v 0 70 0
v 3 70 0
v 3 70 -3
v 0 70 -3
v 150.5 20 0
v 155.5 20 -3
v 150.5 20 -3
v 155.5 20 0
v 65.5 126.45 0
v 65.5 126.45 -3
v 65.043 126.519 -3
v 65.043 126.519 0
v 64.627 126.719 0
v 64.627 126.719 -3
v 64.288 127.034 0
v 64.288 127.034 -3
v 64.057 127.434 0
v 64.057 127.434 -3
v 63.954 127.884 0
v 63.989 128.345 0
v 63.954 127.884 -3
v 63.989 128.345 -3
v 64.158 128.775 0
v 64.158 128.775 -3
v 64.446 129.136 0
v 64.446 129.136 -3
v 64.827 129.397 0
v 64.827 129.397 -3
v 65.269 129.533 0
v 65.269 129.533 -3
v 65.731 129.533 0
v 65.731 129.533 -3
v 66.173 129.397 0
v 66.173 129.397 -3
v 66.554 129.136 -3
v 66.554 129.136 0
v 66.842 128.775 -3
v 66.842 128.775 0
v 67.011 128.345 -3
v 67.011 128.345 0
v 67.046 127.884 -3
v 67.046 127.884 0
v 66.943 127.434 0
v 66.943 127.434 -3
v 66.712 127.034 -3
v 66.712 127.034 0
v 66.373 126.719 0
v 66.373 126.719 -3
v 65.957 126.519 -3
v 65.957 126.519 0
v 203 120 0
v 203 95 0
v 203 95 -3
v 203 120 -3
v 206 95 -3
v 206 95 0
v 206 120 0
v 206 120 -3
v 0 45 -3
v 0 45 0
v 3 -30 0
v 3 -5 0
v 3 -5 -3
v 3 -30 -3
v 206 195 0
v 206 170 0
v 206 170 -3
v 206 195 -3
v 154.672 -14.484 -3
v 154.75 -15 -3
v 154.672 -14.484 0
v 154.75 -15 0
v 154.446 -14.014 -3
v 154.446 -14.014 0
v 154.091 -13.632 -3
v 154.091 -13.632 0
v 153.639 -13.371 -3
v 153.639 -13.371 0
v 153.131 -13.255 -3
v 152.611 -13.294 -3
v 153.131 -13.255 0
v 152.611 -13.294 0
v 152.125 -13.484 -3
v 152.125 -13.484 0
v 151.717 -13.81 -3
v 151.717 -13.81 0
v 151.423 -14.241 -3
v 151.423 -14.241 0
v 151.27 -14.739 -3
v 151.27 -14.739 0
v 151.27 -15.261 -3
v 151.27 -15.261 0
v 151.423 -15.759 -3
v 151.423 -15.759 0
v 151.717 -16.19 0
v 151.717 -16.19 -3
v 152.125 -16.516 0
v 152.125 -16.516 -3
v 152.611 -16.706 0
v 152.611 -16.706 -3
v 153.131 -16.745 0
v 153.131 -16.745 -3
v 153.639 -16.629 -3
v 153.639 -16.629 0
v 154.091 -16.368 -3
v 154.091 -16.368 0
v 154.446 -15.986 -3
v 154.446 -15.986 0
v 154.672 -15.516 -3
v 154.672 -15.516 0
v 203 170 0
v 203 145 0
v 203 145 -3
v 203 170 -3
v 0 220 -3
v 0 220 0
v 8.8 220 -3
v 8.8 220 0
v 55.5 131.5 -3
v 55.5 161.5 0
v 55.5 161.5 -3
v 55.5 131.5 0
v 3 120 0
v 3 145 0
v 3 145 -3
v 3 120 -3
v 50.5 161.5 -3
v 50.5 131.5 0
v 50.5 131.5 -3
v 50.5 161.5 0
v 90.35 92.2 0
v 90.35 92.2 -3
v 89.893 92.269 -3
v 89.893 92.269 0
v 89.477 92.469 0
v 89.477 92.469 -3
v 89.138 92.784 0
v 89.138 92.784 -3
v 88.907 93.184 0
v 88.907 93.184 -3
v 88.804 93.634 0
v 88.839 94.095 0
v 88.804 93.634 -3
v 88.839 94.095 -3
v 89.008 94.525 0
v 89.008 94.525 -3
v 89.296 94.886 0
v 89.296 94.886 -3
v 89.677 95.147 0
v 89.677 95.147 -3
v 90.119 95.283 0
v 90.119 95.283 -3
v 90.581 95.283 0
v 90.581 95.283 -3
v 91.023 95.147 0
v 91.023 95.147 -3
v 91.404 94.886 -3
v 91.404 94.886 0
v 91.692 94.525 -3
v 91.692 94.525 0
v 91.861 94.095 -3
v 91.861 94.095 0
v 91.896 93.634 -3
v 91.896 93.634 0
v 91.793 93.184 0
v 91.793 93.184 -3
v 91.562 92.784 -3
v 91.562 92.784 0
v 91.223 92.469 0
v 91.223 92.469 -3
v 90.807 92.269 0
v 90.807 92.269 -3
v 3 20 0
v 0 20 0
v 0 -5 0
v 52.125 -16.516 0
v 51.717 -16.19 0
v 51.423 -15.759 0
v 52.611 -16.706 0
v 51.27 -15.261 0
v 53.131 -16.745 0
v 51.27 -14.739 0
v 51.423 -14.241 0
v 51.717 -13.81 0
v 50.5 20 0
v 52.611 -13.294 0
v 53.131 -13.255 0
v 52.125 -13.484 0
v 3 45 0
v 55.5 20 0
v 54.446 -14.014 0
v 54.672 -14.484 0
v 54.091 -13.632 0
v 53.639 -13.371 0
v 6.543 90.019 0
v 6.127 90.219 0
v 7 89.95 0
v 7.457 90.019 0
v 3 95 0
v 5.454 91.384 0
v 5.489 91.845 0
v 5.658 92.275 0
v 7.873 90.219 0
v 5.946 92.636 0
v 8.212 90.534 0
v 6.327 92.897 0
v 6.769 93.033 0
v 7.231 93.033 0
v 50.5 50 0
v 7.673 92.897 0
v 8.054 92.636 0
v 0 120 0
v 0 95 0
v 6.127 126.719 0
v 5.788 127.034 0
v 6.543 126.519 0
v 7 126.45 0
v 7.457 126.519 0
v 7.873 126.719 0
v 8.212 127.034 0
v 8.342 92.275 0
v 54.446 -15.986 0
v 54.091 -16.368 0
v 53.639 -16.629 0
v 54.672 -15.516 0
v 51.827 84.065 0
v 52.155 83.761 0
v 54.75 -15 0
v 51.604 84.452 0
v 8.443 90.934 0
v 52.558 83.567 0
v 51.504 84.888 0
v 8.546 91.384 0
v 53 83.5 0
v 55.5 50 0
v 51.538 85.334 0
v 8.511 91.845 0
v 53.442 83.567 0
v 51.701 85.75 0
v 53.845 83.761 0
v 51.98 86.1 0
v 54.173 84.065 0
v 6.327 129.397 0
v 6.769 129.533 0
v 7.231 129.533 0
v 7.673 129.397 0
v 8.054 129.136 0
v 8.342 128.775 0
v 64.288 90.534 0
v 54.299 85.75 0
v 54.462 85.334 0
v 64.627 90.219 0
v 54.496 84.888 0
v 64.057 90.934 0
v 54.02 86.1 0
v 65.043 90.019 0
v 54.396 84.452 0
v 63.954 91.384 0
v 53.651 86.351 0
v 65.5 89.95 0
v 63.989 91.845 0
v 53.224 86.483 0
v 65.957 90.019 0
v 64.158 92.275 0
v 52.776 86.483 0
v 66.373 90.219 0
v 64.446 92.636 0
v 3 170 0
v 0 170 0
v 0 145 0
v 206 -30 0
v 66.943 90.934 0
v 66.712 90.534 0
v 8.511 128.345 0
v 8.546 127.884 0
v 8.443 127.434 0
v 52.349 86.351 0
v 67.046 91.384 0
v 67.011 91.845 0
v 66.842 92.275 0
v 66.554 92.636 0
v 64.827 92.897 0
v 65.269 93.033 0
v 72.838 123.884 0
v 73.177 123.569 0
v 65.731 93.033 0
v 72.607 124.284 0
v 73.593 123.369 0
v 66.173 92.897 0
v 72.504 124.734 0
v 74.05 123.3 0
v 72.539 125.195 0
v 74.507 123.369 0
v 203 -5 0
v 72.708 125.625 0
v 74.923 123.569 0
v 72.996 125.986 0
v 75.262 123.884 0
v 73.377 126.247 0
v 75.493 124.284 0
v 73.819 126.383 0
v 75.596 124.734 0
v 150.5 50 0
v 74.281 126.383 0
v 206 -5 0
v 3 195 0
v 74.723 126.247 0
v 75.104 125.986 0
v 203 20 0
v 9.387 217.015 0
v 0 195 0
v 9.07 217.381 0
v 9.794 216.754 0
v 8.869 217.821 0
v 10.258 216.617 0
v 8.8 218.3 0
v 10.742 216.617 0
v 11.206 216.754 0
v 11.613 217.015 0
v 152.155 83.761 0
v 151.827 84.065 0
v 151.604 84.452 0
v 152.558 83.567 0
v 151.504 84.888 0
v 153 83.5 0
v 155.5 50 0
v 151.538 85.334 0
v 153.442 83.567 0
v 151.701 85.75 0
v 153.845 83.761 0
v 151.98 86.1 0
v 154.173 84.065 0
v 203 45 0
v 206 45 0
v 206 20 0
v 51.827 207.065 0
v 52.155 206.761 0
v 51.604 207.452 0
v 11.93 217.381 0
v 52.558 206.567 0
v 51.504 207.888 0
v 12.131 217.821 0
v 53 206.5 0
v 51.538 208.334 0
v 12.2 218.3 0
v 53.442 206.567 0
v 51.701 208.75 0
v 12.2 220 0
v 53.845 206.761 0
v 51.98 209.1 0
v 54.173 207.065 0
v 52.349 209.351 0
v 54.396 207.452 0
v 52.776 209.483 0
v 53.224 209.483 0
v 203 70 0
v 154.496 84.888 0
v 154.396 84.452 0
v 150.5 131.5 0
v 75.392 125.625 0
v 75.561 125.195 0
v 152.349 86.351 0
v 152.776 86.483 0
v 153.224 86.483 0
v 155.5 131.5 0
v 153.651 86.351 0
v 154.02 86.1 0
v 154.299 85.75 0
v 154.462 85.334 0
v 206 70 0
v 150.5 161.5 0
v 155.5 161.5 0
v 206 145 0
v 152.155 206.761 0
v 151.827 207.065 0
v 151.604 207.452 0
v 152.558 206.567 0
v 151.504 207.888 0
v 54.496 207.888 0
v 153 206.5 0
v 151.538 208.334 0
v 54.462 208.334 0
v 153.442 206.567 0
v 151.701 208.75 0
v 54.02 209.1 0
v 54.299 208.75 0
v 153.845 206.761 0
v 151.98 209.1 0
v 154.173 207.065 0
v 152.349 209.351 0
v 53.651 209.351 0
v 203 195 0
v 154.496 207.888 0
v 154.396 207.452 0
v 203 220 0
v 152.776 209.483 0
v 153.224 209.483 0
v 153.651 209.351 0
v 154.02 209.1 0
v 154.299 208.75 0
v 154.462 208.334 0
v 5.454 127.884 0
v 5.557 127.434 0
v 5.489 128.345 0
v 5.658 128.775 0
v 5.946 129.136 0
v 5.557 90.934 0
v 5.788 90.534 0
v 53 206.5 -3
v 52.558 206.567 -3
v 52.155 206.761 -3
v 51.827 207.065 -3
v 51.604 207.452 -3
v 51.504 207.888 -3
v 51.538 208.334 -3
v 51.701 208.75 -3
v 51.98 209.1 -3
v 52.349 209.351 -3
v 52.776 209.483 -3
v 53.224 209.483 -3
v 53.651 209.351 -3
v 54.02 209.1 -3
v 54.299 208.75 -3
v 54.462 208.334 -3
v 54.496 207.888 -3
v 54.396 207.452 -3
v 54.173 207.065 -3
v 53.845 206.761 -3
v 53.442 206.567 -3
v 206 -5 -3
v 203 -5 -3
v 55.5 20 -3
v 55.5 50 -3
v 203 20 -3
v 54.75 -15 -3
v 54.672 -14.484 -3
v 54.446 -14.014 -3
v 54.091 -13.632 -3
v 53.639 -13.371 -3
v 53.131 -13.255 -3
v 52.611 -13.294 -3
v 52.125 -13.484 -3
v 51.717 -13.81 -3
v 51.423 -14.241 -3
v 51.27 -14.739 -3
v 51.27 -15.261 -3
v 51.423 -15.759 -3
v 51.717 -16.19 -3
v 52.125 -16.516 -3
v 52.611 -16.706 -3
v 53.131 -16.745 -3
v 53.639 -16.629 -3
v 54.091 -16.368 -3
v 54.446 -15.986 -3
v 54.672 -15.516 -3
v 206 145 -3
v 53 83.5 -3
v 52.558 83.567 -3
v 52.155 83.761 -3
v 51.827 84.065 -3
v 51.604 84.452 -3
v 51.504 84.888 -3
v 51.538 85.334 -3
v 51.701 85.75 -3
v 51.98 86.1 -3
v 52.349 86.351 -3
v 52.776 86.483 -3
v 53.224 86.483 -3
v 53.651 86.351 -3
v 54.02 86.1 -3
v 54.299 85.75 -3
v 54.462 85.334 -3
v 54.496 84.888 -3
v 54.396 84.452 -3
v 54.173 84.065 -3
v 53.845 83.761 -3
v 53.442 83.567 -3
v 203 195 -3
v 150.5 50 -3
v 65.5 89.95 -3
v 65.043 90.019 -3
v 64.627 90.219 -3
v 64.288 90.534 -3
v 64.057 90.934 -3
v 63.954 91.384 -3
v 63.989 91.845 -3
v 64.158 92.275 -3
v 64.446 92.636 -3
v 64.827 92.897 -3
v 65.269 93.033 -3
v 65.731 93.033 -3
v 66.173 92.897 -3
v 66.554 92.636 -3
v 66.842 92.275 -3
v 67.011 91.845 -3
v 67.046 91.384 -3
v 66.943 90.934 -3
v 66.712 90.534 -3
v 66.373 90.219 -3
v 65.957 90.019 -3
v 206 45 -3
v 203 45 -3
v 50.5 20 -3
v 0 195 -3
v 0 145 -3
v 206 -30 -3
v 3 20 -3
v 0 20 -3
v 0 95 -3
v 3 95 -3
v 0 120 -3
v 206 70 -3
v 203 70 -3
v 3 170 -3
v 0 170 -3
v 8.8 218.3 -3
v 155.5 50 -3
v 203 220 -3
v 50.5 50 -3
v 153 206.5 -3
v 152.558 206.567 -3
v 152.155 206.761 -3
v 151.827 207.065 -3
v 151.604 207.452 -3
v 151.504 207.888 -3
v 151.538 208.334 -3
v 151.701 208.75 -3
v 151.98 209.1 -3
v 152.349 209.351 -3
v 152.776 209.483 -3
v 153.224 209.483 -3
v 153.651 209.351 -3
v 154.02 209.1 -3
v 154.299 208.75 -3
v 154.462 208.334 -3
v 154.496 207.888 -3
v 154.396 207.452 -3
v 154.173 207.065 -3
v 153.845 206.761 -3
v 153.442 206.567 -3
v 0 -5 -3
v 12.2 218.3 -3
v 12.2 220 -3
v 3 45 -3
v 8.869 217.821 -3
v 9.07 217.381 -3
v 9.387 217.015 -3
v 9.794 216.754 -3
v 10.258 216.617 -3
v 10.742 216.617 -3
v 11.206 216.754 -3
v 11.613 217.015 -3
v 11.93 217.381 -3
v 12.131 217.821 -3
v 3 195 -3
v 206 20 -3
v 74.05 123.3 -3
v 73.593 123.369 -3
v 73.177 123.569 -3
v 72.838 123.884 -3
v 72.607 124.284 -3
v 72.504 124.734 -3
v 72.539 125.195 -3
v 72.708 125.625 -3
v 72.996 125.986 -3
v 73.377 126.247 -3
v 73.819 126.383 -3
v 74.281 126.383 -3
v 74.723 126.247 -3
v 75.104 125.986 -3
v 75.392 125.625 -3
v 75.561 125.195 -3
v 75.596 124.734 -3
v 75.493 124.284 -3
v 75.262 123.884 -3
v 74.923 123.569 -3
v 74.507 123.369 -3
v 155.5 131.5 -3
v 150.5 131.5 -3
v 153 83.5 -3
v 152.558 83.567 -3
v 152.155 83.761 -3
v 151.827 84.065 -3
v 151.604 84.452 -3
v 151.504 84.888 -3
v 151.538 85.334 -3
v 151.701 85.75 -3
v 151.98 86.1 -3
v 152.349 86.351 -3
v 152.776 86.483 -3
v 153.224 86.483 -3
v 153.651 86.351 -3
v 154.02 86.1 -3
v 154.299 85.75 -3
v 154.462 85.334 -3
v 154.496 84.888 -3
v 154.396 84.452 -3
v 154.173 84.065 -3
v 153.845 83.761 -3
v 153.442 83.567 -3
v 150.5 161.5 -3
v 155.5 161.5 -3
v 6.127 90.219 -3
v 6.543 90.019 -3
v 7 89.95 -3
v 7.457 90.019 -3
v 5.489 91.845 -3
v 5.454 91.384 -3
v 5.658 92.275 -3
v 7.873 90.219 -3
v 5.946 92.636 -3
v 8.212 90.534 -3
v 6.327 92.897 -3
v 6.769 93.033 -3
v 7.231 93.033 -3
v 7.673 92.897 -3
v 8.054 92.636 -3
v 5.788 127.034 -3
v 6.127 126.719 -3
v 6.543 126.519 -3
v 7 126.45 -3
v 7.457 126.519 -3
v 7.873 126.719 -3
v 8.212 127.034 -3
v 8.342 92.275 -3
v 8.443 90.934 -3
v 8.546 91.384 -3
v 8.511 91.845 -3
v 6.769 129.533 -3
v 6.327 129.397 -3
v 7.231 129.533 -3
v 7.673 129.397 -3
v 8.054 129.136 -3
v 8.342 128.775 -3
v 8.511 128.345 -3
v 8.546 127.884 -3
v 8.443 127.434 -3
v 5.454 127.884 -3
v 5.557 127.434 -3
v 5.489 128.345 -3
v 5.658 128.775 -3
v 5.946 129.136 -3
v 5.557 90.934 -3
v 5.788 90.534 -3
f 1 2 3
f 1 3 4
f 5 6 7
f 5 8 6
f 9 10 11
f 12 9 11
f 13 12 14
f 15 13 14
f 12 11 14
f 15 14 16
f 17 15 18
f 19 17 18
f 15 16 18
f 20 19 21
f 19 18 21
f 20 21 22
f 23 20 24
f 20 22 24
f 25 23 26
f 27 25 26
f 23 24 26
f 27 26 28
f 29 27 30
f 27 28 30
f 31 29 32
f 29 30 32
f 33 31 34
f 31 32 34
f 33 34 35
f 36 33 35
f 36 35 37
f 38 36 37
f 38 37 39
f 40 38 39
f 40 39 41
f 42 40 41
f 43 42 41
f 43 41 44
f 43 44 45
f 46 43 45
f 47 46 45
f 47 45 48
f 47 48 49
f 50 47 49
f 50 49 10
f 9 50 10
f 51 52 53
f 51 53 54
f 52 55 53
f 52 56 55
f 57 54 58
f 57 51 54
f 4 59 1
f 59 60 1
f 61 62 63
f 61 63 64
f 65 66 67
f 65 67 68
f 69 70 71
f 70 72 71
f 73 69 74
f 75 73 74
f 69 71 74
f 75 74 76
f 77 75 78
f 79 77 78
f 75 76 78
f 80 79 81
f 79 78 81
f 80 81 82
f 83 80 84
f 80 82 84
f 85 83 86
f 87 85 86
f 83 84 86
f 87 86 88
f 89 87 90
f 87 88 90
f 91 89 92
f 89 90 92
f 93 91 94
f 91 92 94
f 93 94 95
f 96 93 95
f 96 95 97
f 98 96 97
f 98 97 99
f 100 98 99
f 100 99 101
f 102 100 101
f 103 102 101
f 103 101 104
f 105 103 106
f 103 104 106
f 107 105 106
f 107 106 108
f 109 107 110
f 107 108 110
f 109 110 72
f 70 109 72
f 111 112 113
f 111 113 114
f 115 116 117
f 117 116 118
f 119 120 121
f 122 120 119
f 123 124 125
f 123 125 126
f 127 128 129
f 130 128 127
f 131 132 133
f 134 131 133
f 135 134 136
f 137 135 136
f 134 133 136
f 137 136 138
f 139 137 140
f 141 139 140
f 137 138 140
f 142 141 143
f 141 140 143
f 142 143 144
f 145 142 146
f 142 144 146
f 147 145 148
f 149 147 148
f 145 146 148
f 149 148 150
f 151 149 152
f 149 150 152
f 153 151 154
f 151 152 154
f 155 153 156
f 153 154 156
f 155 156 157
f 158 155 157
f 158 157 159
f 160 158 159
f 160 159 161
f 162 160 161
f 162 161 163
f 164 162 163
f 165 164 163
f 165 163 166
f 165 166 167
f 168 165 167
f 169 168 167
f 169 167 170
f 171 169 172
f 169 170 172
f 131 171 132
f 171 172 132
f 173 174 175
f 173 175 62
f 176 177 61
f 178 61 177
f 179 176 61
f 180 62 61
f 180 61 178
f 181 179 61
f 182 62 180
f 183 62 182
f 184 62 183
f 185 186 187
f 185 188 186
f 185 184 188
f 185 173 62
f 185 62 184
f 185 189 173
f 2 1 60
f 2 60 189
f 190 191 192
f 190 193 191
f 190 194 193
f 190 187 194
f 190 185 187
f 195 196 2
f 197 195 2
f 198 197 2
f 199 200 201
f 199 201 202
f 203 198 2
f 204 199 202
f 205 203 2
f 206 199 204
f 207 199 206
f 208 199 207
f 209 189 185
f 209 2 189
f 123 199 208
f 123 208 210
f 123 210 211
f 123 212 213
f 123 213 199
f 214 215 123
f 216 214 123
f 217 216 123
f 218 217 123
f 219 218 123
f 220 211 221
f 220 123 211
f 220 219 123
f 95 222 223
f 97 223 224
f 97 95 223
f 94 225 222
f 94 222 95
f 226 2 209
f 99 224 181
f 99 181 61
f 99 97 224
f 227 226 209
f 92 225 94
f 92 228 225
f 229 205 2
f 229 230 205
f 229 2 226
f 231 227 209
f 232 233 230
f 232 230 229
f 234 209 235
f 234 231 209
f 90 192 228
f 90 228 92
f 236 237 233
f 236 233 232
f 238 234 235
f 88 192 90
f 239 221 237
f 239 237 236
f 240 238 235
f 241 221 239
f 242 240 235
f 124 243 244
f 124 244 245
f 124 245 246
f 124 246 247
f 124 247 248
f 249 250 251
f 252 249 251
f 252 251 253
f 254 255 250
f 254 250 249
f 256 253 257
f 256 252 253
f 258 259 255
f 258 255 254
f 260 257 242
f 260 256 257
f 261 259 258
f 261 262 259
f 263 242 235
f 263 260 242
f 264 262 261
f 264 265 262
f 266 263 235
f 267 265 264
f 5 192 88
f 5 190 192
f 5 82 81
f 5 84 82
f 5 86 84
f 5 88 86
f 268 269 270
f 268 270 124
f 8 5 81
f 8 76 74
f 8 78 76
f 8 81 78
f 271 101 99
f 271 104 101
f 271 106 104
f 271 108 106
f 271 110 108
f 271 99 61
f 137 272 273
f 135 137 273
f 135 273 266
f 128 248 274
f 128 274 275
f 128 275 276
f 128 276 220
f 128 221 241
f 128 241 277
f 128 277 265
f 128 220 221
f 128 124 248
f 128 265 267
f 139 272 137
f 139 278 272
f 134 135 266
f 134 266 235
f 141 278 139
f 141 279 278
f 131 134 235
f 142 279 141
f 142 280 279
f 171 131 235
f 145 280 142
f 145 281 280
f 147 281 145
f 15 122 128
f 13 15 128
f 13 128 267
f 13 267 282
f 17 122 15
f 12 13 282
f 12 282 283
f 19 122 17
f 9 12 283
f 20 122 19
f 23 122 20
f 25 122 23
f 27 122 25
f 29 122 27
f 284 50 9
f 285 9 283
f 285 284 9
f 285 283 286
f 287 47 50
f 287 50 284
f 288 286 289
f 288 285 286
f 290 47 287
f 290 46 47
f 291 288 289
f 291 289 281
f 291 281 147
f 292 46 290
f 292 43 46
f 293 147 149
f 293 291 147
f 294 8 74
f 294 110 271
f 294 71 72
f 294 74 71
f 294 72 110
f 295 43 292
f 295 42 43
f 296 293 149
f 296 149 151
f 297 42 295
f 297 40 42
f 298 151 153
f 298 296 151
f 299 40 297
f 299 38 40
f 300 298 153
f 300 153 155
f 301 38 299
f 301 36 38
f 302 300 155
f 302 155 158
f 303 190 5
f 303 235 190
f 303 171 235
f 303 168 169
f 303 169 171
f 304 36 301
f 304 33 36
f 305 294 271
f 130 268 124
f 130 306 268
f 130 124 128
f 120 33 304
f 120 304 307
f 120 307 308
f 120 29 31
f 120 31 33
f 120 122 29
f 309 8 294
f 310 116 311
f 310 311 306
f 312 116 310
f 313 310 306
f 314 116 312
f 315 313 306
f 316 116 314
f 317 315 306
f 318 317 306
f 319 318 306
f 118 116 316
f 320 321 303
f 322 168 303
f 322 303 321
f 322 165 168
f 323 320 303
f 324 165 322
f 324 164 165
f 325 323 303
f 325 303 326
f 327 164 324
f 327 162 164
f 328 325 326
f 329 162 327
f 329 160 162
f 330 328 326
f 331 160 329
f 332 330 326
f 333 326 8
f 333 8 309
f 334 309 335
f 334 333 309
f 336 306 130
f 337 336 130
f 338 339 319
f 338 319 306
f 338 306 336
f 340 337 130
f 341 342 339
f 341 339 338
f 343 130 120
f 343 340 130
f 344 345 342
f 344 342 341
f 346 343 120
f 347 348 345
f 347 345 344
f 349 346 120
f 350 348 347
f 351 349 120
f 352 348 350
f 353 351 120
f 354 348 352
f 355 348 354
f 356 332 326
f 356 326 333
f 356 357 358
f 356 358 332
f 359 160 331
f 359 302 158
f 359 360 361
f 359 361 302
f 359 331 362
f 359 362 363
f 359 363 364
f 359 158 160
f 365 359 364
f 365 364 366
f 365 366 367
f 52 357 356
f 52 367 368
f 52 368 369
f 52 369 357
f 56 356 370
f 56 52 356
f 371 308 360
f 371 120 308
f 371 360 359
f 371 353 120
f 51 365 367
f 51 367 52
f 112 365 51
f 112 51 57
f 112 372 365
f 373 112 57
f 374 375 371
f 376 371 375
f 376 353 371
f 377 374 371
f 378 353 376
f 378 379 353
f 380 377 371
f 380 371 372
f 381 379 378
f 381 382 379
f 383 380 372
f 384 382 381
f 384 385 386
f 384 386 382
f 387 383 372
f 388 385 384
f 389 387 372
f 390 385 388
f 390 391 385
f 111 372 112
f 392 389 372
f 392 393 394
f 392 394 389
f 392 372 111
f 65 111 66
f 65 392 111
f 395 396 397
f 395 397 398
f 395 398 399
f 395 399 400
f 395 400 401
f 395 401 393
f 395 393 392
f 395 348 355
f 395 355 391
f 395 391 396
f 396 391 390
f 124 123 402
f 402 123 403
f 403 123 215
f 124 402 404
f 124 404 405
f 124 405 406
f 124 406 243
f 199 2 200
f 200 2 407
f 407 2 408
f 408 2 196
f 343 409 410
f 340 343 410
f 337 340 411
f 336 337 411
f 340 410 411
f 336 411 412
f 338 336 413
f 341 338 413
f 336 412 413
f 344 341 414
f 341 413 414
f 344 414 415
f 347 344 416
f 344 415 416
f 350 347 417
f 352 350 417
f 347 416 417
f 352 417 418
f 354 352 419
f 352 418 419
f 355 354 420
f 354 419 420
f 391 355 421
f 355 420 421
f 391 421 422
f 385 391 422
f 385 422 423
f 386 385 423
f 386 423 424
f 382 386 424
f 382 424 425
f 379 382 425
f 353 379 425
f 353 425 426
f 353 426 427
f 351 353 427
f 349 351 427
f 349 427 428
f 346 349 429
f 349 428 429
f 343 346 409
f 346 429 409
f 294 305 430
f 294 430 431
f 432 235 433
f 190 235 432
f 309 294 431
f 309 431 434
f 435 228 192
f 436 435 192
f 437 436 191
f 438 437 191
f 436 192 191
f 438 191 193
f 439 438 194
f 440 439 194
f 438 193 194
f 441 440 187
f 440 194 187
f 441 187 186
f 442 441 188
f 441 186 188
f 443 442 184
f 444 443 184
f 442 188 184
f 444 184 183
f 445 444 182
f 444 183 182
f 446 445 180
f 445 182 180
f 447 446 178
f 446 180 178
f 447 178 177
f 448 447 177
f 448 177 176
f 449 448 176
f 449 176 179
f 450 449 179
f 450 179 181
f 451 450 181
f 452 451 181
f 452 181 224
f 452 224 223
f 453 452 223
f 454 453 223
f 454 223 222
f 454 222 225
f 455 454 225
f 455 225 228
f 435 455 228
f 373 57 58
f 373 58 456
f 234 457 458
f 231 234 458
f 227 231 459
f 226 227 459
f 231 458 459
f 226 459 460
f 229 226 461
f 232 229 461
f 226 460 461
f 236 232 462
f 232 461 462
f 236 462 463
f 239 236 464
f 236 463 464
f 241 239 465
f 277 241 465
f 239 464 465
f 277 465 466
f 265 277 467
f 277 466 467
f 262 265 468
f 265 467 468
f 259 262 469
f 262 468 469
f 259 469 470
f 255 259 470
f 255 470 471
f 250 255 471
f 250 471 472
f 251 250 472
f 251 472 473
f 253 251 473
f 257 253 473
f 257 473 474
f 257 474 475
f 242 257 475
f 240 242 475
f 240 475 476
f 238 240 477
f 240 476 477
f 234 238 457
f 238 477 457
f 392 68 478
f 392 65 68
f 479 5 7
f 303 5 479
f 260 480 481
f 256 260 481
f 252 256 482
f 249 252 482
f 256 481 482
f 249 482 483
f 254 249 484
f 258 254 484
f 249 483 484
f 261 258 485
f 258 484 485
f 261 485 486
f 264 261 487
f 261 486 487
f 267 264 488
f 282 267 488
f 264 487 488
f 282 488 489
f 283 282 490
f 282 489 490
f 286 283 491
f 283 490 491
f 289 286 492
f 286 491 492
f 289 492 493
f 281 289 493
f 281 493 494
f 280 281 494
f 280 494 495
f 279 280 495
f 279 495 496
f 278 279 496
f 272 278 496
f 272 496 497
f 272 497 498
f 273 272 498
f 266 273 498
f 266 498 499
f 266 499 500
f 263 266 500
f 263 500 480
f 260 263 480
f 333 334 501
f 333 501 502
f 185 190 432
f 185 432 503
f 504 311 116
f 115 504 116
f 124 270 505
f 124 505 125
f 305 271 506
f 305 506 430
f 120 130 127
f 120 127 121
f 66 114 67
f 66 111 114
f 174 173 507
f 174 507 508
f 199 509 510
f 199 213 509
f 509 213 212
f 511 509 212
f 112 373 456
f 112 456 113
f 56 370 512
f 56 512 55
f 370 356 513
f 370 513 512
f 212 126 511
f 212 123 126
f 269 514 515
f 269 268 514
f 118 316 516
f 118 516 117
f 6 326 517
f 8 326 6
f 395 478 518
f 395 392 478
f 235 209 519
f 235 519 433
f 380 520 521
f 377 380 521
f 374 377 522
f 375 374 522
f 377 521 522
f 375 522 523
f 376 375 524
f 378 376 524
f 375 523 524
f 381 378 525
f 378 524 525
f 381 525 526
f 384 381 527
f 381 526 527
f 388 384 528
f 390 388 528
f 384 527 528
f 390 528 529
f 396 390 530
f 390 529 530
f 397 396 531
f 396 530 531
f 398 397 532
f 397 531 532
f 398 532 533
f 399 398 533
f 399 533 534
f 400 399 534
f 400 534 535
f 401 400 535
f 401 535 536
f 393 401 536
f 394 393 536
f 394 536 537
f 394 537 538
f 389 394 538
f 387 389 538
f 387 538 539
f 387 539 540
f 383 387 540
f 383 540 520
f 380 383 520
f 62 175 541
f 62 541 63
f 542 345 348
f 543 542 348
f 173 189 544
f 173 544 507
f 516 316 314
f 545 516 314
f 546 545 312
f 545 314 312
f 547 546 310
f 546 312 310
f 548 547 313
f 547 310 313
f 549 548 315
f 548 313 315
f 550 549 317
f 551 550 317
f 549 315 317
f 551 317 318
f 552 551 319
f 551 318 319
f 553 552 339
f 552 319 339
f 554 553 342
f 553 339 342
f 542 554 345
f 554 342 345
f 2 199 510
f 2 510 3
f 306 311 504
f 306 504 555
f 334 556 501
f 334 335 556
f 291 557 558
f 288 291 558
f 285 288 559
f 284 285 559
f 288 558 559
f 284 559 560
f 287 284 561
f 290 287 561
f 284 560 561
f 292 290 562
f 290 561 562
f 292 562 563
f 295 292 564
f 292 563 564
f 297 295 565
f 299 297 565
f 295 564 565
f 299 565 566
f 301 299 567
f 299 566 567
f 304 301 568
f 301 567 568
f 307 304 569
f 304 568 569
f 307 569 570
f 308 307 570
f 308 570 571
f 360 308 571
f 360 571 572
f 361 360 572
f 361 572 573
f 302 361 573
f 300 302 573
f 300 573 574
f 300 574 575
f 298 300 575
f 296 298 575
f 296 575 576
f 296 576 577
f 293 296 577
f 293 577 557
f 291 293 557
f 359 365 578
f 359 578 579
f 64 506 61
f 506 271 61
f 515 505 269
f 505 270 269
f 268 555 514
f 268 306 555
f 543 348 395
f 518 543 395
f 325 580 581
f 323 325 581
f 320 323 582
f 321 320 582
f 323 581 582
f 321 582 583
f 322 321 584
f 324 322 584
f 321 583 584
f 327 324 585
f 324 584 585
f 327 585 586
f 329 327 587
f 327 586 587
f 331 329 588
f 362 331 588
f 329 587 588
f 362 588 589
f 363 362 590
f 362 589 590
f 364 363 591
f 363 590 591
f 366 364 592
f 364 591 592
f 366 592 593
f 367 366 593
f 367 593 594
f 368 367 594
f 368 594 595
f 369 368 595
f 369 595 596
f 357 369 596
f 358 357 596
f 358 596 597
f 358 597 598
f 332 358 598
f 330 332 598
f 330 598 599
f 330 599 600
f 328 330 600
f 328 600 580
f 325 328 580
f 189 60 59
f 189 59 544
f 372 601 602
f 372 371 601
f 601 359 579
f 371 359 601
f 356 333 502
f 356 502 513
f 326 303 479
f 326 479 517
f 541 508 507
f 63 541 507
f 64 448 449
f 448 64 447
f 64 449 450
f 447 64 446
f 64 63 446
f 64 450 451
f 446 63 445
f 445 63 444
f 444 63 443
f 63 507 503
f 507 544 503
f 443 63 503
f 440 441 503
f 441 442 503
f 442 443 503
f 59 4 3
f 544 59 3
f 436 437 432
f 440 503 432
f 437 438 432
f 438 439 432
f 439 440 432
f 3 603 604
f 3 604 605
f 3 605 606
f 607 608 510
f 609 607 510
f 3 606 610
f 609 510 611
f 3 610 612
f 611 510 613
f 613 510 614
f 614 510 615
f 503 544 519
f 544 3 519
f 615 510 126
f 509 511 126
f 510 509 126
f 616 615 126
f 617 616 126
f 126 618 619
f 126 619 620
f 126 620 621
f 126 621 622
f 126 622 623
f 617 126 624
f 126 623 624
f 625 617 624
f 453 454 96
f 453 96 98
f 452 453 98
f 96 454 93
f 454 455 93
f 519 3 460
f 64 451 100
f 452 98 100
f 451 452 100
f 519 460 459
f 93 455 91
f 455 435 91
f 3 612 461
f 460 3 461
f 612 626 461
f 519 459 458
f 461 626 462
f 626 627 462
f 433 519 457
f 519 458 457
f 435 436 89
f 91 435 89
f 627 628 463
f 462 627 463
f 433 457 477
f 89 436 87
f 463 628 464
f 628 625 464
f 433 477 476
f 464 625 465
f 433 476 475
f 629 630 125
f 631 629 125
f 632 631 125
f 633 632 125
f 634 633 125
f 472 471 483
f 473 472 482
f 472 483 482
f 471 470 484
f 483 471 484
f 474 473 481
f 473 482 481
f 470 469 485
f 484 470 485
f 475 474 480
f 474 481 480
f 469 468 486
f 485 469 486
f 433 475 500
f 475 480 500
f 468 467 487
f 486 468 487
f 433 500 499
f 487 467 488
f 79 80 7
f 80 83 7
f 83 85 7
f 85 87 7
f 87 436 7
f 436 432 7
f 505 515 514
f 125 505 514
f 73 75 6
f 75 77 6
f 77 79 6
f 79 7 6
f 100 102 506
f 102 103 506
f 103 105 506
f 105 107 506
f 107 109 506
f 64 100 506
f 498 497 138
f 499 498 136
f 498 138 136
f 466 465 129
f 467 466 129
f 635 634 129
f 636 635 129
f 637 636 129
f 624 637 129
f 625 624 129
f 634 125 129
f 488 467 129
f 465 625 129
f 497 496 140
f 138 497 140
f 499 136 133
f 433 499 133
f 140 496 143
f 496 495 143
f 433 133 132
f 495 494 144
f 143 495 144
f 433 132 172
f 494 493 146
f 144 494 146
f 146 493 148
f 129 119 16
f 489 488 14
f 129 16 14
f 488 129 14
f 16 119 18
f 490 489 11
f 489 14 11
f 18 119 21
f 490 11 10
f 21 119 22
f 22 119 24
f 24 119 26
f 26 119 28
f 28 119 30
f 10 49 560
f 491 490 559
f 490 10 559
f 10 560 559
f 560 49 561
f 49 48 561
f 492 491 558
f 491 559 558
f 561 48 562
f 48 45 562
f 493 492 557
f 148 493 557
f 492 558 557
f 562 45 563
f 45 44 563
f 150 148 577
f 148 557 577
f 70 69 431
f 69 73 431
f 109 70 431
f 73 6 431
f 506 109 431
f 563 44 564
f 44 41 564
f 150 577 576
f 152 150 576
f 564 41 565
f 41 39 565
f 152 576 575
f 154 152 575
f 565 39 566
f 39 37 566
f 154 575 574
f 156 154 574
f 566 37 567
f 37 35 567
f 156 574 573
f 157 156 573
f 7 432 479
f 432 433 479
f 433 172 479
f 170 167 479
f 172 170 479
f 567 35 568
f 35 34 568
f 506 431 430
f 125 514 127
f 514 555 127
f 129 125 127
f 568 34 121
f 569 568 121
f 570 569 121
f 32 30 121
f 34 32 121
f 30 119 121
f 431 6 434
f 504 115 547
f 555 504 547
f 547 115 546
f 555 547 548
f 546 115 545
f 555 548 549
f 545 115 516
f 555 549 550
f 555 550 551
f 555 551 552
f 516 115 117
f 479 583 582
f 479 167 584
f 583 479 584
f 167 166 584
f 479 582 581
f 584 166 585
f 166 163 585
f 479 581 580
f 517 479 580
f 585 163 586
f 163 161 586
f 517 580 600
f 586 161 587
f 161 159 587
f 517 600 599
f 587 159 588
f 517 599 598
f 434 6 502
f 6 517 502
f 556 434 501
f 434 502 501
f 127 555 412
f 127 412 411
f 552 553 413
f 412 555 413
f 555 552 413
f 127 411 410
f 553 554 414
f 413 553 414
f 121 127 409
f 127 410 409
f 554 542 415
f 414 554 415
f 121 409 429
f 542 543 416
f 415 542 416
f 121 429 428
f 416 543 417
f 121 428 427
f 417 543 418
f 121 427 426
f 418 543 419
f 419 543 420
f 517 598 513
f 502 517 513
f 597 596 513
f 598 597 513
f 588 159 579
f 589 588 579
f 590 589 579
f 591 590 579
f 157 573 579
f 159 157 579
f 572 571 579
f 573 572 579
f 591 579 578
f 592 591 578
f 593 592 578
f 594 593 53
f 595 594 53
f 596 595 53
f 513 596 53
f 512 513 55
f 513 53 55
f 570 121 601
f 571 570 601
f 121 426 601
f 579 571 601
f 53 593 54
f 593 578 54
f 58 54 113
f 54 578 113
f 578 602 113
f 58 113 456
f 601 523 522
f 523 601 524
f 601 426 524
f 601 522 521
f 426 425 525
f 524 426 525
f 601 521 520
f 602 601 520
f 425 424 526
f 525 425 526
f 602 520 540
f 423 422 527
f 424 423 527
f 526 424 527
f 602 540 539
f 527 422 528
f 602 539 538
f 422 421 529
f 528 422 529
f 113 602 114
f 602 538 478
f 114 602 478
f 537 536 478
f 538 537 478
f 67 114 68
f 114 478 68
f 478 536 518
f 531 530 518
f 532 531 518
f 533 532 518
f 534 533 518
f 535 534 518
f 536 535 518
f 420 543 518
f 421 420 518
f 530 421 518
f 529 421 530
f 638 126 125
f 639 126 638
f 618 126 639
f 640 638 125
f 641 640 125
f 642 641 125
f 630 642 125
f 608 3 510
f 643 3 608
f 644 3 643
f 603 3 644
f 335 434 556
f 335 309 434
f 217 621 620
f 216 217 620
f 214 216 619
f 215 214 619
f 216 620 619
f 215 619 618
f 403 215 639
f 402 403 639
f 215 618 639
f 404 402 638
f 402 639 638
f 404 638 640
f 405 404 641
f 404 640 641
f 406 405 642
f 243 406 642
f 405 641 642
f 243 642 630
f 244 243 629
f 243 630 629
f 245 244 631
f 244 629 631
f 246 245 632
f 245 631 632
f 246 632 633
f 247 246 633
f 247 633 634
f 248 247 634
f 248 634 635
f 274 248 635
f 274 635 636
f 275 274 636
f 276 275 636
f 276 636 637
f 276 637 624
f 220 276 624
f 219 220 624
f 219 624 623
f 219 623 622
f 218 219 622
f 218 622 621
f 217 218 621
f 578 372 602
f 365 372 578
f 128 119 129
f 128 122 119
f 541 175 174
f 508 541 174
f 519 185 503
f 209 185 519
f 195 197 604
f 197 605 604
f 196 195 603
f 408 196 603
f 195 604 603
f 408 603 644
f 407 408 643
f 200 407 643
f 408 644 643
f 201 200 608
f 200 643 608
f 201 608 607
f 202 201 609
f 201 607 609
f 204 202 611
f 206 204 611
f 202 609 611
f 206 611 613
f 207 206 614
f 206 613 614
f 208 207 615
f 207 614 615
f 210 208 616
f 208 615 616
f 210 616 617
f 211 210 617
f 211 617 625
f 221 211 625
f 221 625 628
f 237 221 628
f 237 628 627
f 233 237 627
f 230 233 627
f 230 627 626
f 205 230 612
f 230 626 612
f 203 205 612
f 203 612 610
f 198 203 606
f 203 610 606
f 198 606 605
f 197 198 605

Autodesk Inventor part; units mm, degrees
ref_plane "YZ Plane" through (0, 0, 0) normal (1, 0, 0) x (0, 1, 0)
ref_plane "XZ Plane" through (0, 0, 0) normal (0, 1, 0) x (-1, 0, 0)
ref_plane "XY Plane" through (0, 0, 0) normal (0, 0, 1) x (1, 0, 0)
sketch "Boceto1" plane through (0, 0, 0) normal (0, 0, 1) x (1, 0, 0)
  line L0 (206, -30) -> (206, 220) projected
  line L1 (0, 220) -> (206, 220) projected
  line L2 (0, -30) -> (0, 220) projected
  line L3 (206, -30) -> (0, -30) projected
  line L4 (206, -30) -> (206, -5)
  line L5 (206, -5) -> (203, -5)
  line L6 (203, -5) -> (203, 20)
  line L7 (203, 20) -> (206, 20)
  line L8 (206, 20) -> (206, 45)
  line L9 (206, 45) -> (203, 45)
  line L10 (203, 45) -> (203, 70)
  line L11 (203, 70) -> (206, 70)
  line L12 (206, 70) -> (206, 95)
  line L13 (206, 95) -> (203, 95)
  line L14 (203, 95) -> (203, 120)
  line L15 (203, 120) -> (206, 120)
  line L16 (206, 120) -> (206, 145)
  line L17 (206, 145) -> (203, 145)
  line L18 (203, 145) -> (203, 170)
  line L19 (203, 170) -> (206, 170)
  line L20 (203, 220) -> (206, 220)
  line L21 (206, 195) -> (203, 195)
  line L22 (203, 195) -> (203, 220)
  line L23 (206, 170) -> (206, 195)
  line L24 (203, 170) -> (206, 170)
  line L25 (0, 220) -> (0, 195)
  line L26 (0, 195) -> (3, 195)
  line L27 (3, 195) -> (3, 170)
  line L28 (3, 170) -> (0, 170)
  line L29 (0, 170) -> (0, 145)
  line L30 (0, 145) -> (3, 145)
  line L31 (3, 145) -> (3, 120)
  line L32 (3, 120) -> (0, 120)
  line L33 (3, 20) -> (0, 20)
  line L34 (0, 45) -> (3, 45)
  line L35 (3, 45) -> (3, 20)
  line L36 (0, 70) -> (0, 45)
  line L37 (3, 70) -> (0, 70)
  line L38 (3, 95) -> (3, 70)
  line L39 (0, 95) -> (3, 95)
  line L40 (0, 120) -> (0, 95)
  line L41 (3, 20) -> (0, 20)
  line L42 (0, 20) -> (0, -5)
  line L43 (0, -5) -> (3, -5)
  line L44 (3, -5) -> (3, -30)
  line L45 (3, -30) -> (0, -30)
  line L46 (203, 220) -> (206, 220)
  line L47 (203, 220) -> (206, 220)
  line L48 (206, 220) -> (206, 245)
  line L49 (206, 245) -> (203, 245)
  line L50 (203, 245) -> (203, 270)
  line L51 (203, 270) -> (206, 270)
  line L52 (0, 220) -> (3, 220)
  line L53 (0, 220) -> (3, 220)
  line L54 (3, 220) -> (3, 245)
  line L55 (3, 245) -> (0, 245)
  line L56 (0, 245) -> (0, 270)
  line L57 (0, 270) -> (3, 270)
  line L58 (206, 270) -> (0, 270)
  point P0 (0, 0)
  dimension "d78" = 3
  dimension "d88" = 3
  dimension "Lengueta" = 25
  dimension "espesor" = 3
  dimension "d2" = 25
  dimension "d3" = 3
  dimension "d4" = 25
  dimension "d5" = 90
  dimension "d6" = 3
  dimension "d7" = 25
  dimension "d8" = 3
  dimension "d9" = 25
  dimension "d10" = 3
  dimension "d11" = 25
  dimension "d12" = 3
  dimension "d13" = 25
  dimension "d14" = 90
  dimension "d15" = 3
  dimension "d16" = 25
  dimension "d17" = 3
  dimension "d18" = 3
  dimension "d19" = 25
  dimension "d20" = 90
  dimension "d21" = 3
  dimension "d22" = 25
  dimension "d23" = 3
  dimension "d26" = 25
  dimension "d27" = 3
  dimension "d28" = 25
  dimension "d29" = 3
  dimension "d30" = 25
  dimension "d31" = 90
  dimension "d32" = 3
  dimension "d33" = 25
  dimension "d34" = 3
  dimension "d35" = 25
  dimension "d36" = 3
  dimension "d37" = 25
  dimension "d38" = 3
  dimension "d39" = 25
  dimension "d40" = 90
  dimension "d41" = 3
  dimension "d42" = 25
  dimension "d43" = 3
  dimension "d44" = 3
  dimension "d45" = 25
  dimension "d46" = 90
  dimension "d47" = 3
  dimension "d48" = 25
  dimension "d49" = 3
  dimension "d71" = 3
  dimension "d72" = 3
  dimension "d73" = 25
  dimension "d74" = 90
  dimension "d75" = 3
  dimension "d76" = 25
  dimension "d77" = 3
  dimension "d81" = 3
  dimension "d82" = 3
  dimension "d83" = 25
  dimension "d84" = 90
  dimension "d85" = 3
  dimension "d86" = 25
  dimension "d87" = 3
extrude "Extrusión1" add sketch "Boceto1" against normal blind 3 contours L3 L44 L43 L2 L33 L35 L34 L37 L38 L39 L32 L31 L30 L28 L27 L26 L1 L22 L21 L0 L19 L18 L17 L15 L14 L13 L11 L10 L9 L7 L6 L5
sketch "Boceto2" plane through (0, 0, 0) normal (0, 0, 1) x (1, 0, 0)
  circle A0 centre (53, -15) radius 1.75
  circle A1 centre (153, -15) radius 1.75
  point P0 (0, 0)
extrude "Extrusión2" cut sketch "Boceto2" against normal blind 3
sketch "Boceto3" plane through (0, 0, 0) normal (0, 0, 1) x (1, 0, 0)
  circle A0 centre (53, 208) radius 2.1
  circle A1 centre (53, 208) radius 1.5
  circle A2 centre (153, 208) radius 2.1
  point P0 (0, 0)
  dimension "d56" = 3
hole "Agujero1" at (53, 208, 0) at (153, 208, 0) direction (0, 0, -1) diameter 3 depth 4
sketch "Boceto4" plane through (0, 0, 0) normal (0, 0, 1) x (1, 0, 0)
  circle A0 centre (53, 85) radius 2.1 projected
  circle A1 centre (153, 85) radius 2.1 projected
  point P0 (0, 0)
hole "Agujero2" at (153, 85, 0) at (53, 85, 0) direction (0, 0, -1) diameter 3 depth 4
sketch "Boceto5" plane through (0, 0, -3) normal (0, 0, -1) x (-1, 0, 0)
  point P0 (0, 0)
sketch "Boceto6" plane through (0, 0, 0) normal (0, 0, 1) x (1, 0, 0)
  circle A0 centre (53, 85) radius 1.5 projected
  circle A1 centre (153, 85) radius 1.5 projected
  circle A2 centre (153, 208) radius 1.5 projected
  circle A3 centre (53, 208) radius 1.5 projected
  circle A4 centre (53, -15) radius 1.75 projected
  circle A5 centre (153, -15) radius 1.75 projected
  line L0 (203, 20) -> (206, 20) projected
  line L1 (206, 20) -> (206, 45) projected
  line L2 (206, 45) -> (203, 45) projected
  line L3 (203, 45) -> (203, 70) projected
  line L4 (203, 70) -> (206, 70) projected
  line L5 (206, 70) -> (206, 95) projected
  line L6 (206, 95) -> (203, 95) projected
  line L7 (203, 95) -> (203, 120) projected
  line L8 (203, 120) -> (206, 120) projected
  line L9 (206, 120) -> (206, 145) projected
  line L10 (206, 145) -> (203, 145) projected
  line L11 (203, 145) -> (203, 170) projected
  line L12 (203, 170) -> (206, 170) projected
  line L13 (206, 170) -> (206, 195) projected
  line L14 (206, 195) -> (203, 195) projected
  line L15 (203, 195) -> (203, 220) projected
  line L16 (203, 220) -> (0, 220) projected
  line L17 (0, 220) -> (0, 195) projected
  line L18 (0, 195) -> (3, 195) projected
  line L19 (3, 195) -> (3, 170) projected
  line L20 (3, 170) -> (0, 170) projected
  line L21 (0, 170) -> (0, 145) projected
  line L22 (0, 145) -> (3, 145) projected
  line L23 (3, 145) -> (3, 120) projected
  line L24 (3, 120) -> (0, 120) projected
  line L25 (0, 120) -> (0, 95) projected
  line L26 (0, 95) -> (3, 95) projected
  line L27 (3, 95) -> (3, 70) projected
  line L28 (3, 70) -> (0, 70) projected
  line L29 (0, 70) -> (0, 45) projected
  line L30 (0, 45) -> (3, 45) projected
  line L31 (3, 45) -> (3, 20) projected
  line L32 (3, 20) -> (0, 20) projected
  line L33 (0, 20) -> (0, -5) projected
  line L34 (0, -5) -> (3, -5) projected
  line L35 (3, -5) -> (3, -30) projected
  line L36 (3, -30) -> (206, -30) projected
  line L37 (206, -30) -> (206, -5) projected
  line L38 (206, -5) -> (203, -5) projected
  line L39 (203, -5) -> (203, 20) projected
  line L40 (153, 85) -> (153, 208)
  line L41 (150.5, 161.5) -> (155.5, 161.5)
  line L42 (155.5, 161.5) -> (155.5, 131.5)
  line L43 (155.5, 131.5) -> (150.5, 131.5)
  line L44 (150.5, 131.5) -> (150.5, 161.5)
  line L45 (150.5, 161.5) -> (155.5, 131.5) construction
  line L46 (155.5, 161.5) -> (150.5, 131.5) construction
  line L47 (53, 85) -> (53, 208)
  line L48 (50.5, 161.5) -> (55.5, 161.5)
  line L49 (55.5, 161.5) -> (55.5, 131.5)
  line L50 (55.5, 131.5) -> (50.5, 131.5)
  line L51 (50.5, 131.5) -> (50.5, 161.5)
  line L52 (50.5, 161.5) -> (55.5, 131.5) construction
  line L53 (55.5, 161.5) -> (50.5, 131.5) construction
  line L54 (53, -15) -> (53, 85)
  line L55 (50.5, 50) -> (55.5, 50)
  line L56 (55.5, 50) -> (55.5, 20)
  line L57 (55.5, 20) -> (50.5, 20)
  line L58 (50.5, 20) -> (50.5, 50)
  line L59 (50.5, 50) -> (55.5, 20) construction
  line L60 (55.5, 50) -> (50.5, 20) construction
  line L61 (150.5, 50) -> (155.5, 50)
  line L62 (155.5, 50) -> (155.5, 20)
  line L63 (155.5, 20) -> (150.5, 20)
  line L64 (150.5, 20) -> (150.5, 50)
  line L65 (150.5, 50) -> (155.5, 20) construction
  line L66 (155.5, 50) -> (150.5, 20) construction
  point P0 (0, 0)
  point P1 (153, 146.5)
  point P2 (53, 146.5)
  point P3 (53, 35)
  point P4 (153, 35)
  dimension "d93" = 5
  dimension "d94" = 30
  dimension "d95" = 5
  dimension "d96" = 30
  dimension "d99" = 5
  dimension "d100" = 30
  dimension "d101" = 5
  dimension "d102" = 30
extrude "Extrusión3" cut sketch "Boceto6" against normal blind 3 contours L55 L56 L57 L54 | L54 L57 L58 L55 | L50 L51 L48 L47 | L47 L48 L49 L50 | L43 L44 L41 L40 | L40 L41 L42 L43 | L61 L62 L63 L64
sketch "Boceto7" plane through (0, 0, 0) normal (0, 0, 1) x (1, 0, 0)
  line L0 (3, 95.5) -> (60.5, 95.5) projected
  line L1 (60.5, 95.5) -> (60.5, 98.5) projected
  line L2 (60.5, 98.5) -> (3, 98.5) projected
  line L3 (3, 98.5) -> (3, 121) projected
  line L4 (3, 121) -> (60.5, 121) projected
  line L5 (60.5, 121) -> (60.5, 124) projected
  line L6 (60.5, 124) -> (3, 124) projected
  line L7 (3, 124) -> (3, 128) projected
  arc A0 (10.873, 129) -> (3, 128) centre (7, 128) ccw projected
  arc A1 (10.873, 129) -> (14.746, 126) centre (14.746, 130) ccw projected
  line L8 (14.746, 126) -> (57.754, 126) projected
  arc A2 (57.754, 126) -> (61.627, 129) centre (57.754, 130) ccw projected
  arc A3 (69.5, 128) -> (61.627, 129) centre (65.5, 128) ccw projected
  line L9 (69.5, 128) -> (69.5, 91.5) projected
  arc A4 (61.627, 90.5) -> (69.5, 91.5) centre (65.5, 91.5) ccw projected
  arc A5 (61.627, 90.5) -> (57.754, 93.5) centre (57.754, 89.5) ccw projected
  line L10 (57.754, 93.5) -> (14.746, 93.5) projected
  arc A6 (14.746, 93.5) -> (10.873, 90.5) centre (14.746, 89.5) ccw projected
  arc A7 (3, 91.5) -> (10.873, 90.5) centre (7, 91.5) ccw projected
  line L11 (3, 91.5) -> (3, 95.5) projected
  line L12 (66.1403, 93.5) -> (64.8597, 93.5) projected
  arc A8 (64.8597, 93.5) -> (66.1403, 93.5) centre (65.5, 91.5) ccw projected
  arc A9 (66.1403, 126) -> (64.8597, 126) centre (65.5, 128) ccw projected
  line L13 (64.8597, 126) -> (66.1403, 126) projected
  line L14 (6.3597, 126) -> (7.6403, 126) projected
  arc A10 (7.6403, 126) -> (6.3597, 126) centre (7, 128) ccw projected
  arc A11 (6.3597, 93.5) -> (7.6403, 93.5) centre (7, 91.5) ccw projected
  line L15 (7.6403, 93.5) -> (6.3597, 93.5) projected
  circle A12 centre (74.05, 124.85) radius 1.55 projected
  circle A13 centre (90.35, 93.75) radius 1.55 projected
  line L16 (92.9, 87.6) -> (71.5, 87.6) projected
  line L17 (71.5, 87.6) -> (71.5, 131) projected
  line L18 (71.5, 131) -> (92.9, 131) projected
  line L19 (92.9, 131) -> (92.9, 87.6) projected
  point P0 (0, 0)
hole "Agujero3" at (65.5, 128, 0) at (7, 128, 0) at (7, 91.5, 0) at (65.5, 91.5, 0) at (90.35, 93.75, 0) at (74.05, 124.85, 0) direction (0, 0, -1) diameter 3.1 end through all
sketch "Boceto8" plane through (0, 0, 0) normal (0, 0, 1) x (1, 0, 0)
  line L0 (0, 220) -> (203, 220) projected
  line L1 (0, 220) -> (3, 220)
  line L2 (3, 220) -> (18, 220)
  line L3 (18, 220) -> (18, 205)
  line L4 (18, 205) -> (3, 205)
  line L5 (3, 205) -> (3, 220)
  line L6 (16.3, 206.7) -> (16.3, 218.3)
  line L7 (16.3, 218.3) -> (4.7, 218.3)
  line L8 (4.7, 218.3) -> (4.7, 206.7)
  line L9 (4.7, 206.7) -> (16.3, 206.7)
  circle A0 centre (10.5, 218.3) radius 1.7
  line L10 (12.2, 218.3) -> (12.2, 220)
  line L11 (8.8, 218.3) -> (8.8, 220)
  point P0 (0, 0)
  dimension "d115" = 3
  dimension "d116" = 15
  dimension "d117" = 15
  dimension "d118" = 1.7
  dimension "d119" = 3.4
extrude "Extrusión4" cut sketch "Boceto8" against normal blind 10 contours L0 A0 L11 | L0 L10 A0 | A0 L7 | L7 A0
equation "\"d2\" = Lengueta"
equation "\"d3\" = espesor"
equation "\"d4\" = Lengueta"
equation "\"d6\" = espesor"
equation "\"d7\" = Lengueta"
equation "\"d8\" = espesor"
equation "\"d11\" = d9"
equation "\"d12\" = d10"
equation "\"d13\" = d9"
equation "\"d16\" = d9"
equation "\"d18\" = d24"
equation "\"d19\" = d25"
equation "\"d22\" = d25"
equation "\"d28\" = d26"
equation "\"d29\" = d27"
equation "\"d30\" = d26"
equation "\"d33\" = d26"
equation "\"d37\" = d35"
equation "\"d38\" = d36"
equation "\"d39\" = d35"
equation "\"d42\" = d35"
equation "\"d44\" = d50"
equation "\"d45\" = d51"
equation "\"d48\" = d51"
equation "\"d71\" = d78"
equation "\"d72\" = d79"
equation "\"d73\" = d80"
equation "\"d76\" = d80"
equation "\"d81\" = d88"
equation "\"d82\" = d89"
equation "\"d83\" = d90"
equation "\"d86\" = d90"
equation "\"d52\" = espesor"
equation "\"d54\" = espesor"
equation "\"d24\" = 3"
equation "\"d25\" = 25"
equation "\"d50\" = 3"
equation "\"d51\" = 25"
equation "\"d79\" = 3"
equation "\"d80\" = 25"
equation "\"d89\" = 3"
equation "\"d90\" = 25"
properties part number "Envolvente_Pared_Trasera"
